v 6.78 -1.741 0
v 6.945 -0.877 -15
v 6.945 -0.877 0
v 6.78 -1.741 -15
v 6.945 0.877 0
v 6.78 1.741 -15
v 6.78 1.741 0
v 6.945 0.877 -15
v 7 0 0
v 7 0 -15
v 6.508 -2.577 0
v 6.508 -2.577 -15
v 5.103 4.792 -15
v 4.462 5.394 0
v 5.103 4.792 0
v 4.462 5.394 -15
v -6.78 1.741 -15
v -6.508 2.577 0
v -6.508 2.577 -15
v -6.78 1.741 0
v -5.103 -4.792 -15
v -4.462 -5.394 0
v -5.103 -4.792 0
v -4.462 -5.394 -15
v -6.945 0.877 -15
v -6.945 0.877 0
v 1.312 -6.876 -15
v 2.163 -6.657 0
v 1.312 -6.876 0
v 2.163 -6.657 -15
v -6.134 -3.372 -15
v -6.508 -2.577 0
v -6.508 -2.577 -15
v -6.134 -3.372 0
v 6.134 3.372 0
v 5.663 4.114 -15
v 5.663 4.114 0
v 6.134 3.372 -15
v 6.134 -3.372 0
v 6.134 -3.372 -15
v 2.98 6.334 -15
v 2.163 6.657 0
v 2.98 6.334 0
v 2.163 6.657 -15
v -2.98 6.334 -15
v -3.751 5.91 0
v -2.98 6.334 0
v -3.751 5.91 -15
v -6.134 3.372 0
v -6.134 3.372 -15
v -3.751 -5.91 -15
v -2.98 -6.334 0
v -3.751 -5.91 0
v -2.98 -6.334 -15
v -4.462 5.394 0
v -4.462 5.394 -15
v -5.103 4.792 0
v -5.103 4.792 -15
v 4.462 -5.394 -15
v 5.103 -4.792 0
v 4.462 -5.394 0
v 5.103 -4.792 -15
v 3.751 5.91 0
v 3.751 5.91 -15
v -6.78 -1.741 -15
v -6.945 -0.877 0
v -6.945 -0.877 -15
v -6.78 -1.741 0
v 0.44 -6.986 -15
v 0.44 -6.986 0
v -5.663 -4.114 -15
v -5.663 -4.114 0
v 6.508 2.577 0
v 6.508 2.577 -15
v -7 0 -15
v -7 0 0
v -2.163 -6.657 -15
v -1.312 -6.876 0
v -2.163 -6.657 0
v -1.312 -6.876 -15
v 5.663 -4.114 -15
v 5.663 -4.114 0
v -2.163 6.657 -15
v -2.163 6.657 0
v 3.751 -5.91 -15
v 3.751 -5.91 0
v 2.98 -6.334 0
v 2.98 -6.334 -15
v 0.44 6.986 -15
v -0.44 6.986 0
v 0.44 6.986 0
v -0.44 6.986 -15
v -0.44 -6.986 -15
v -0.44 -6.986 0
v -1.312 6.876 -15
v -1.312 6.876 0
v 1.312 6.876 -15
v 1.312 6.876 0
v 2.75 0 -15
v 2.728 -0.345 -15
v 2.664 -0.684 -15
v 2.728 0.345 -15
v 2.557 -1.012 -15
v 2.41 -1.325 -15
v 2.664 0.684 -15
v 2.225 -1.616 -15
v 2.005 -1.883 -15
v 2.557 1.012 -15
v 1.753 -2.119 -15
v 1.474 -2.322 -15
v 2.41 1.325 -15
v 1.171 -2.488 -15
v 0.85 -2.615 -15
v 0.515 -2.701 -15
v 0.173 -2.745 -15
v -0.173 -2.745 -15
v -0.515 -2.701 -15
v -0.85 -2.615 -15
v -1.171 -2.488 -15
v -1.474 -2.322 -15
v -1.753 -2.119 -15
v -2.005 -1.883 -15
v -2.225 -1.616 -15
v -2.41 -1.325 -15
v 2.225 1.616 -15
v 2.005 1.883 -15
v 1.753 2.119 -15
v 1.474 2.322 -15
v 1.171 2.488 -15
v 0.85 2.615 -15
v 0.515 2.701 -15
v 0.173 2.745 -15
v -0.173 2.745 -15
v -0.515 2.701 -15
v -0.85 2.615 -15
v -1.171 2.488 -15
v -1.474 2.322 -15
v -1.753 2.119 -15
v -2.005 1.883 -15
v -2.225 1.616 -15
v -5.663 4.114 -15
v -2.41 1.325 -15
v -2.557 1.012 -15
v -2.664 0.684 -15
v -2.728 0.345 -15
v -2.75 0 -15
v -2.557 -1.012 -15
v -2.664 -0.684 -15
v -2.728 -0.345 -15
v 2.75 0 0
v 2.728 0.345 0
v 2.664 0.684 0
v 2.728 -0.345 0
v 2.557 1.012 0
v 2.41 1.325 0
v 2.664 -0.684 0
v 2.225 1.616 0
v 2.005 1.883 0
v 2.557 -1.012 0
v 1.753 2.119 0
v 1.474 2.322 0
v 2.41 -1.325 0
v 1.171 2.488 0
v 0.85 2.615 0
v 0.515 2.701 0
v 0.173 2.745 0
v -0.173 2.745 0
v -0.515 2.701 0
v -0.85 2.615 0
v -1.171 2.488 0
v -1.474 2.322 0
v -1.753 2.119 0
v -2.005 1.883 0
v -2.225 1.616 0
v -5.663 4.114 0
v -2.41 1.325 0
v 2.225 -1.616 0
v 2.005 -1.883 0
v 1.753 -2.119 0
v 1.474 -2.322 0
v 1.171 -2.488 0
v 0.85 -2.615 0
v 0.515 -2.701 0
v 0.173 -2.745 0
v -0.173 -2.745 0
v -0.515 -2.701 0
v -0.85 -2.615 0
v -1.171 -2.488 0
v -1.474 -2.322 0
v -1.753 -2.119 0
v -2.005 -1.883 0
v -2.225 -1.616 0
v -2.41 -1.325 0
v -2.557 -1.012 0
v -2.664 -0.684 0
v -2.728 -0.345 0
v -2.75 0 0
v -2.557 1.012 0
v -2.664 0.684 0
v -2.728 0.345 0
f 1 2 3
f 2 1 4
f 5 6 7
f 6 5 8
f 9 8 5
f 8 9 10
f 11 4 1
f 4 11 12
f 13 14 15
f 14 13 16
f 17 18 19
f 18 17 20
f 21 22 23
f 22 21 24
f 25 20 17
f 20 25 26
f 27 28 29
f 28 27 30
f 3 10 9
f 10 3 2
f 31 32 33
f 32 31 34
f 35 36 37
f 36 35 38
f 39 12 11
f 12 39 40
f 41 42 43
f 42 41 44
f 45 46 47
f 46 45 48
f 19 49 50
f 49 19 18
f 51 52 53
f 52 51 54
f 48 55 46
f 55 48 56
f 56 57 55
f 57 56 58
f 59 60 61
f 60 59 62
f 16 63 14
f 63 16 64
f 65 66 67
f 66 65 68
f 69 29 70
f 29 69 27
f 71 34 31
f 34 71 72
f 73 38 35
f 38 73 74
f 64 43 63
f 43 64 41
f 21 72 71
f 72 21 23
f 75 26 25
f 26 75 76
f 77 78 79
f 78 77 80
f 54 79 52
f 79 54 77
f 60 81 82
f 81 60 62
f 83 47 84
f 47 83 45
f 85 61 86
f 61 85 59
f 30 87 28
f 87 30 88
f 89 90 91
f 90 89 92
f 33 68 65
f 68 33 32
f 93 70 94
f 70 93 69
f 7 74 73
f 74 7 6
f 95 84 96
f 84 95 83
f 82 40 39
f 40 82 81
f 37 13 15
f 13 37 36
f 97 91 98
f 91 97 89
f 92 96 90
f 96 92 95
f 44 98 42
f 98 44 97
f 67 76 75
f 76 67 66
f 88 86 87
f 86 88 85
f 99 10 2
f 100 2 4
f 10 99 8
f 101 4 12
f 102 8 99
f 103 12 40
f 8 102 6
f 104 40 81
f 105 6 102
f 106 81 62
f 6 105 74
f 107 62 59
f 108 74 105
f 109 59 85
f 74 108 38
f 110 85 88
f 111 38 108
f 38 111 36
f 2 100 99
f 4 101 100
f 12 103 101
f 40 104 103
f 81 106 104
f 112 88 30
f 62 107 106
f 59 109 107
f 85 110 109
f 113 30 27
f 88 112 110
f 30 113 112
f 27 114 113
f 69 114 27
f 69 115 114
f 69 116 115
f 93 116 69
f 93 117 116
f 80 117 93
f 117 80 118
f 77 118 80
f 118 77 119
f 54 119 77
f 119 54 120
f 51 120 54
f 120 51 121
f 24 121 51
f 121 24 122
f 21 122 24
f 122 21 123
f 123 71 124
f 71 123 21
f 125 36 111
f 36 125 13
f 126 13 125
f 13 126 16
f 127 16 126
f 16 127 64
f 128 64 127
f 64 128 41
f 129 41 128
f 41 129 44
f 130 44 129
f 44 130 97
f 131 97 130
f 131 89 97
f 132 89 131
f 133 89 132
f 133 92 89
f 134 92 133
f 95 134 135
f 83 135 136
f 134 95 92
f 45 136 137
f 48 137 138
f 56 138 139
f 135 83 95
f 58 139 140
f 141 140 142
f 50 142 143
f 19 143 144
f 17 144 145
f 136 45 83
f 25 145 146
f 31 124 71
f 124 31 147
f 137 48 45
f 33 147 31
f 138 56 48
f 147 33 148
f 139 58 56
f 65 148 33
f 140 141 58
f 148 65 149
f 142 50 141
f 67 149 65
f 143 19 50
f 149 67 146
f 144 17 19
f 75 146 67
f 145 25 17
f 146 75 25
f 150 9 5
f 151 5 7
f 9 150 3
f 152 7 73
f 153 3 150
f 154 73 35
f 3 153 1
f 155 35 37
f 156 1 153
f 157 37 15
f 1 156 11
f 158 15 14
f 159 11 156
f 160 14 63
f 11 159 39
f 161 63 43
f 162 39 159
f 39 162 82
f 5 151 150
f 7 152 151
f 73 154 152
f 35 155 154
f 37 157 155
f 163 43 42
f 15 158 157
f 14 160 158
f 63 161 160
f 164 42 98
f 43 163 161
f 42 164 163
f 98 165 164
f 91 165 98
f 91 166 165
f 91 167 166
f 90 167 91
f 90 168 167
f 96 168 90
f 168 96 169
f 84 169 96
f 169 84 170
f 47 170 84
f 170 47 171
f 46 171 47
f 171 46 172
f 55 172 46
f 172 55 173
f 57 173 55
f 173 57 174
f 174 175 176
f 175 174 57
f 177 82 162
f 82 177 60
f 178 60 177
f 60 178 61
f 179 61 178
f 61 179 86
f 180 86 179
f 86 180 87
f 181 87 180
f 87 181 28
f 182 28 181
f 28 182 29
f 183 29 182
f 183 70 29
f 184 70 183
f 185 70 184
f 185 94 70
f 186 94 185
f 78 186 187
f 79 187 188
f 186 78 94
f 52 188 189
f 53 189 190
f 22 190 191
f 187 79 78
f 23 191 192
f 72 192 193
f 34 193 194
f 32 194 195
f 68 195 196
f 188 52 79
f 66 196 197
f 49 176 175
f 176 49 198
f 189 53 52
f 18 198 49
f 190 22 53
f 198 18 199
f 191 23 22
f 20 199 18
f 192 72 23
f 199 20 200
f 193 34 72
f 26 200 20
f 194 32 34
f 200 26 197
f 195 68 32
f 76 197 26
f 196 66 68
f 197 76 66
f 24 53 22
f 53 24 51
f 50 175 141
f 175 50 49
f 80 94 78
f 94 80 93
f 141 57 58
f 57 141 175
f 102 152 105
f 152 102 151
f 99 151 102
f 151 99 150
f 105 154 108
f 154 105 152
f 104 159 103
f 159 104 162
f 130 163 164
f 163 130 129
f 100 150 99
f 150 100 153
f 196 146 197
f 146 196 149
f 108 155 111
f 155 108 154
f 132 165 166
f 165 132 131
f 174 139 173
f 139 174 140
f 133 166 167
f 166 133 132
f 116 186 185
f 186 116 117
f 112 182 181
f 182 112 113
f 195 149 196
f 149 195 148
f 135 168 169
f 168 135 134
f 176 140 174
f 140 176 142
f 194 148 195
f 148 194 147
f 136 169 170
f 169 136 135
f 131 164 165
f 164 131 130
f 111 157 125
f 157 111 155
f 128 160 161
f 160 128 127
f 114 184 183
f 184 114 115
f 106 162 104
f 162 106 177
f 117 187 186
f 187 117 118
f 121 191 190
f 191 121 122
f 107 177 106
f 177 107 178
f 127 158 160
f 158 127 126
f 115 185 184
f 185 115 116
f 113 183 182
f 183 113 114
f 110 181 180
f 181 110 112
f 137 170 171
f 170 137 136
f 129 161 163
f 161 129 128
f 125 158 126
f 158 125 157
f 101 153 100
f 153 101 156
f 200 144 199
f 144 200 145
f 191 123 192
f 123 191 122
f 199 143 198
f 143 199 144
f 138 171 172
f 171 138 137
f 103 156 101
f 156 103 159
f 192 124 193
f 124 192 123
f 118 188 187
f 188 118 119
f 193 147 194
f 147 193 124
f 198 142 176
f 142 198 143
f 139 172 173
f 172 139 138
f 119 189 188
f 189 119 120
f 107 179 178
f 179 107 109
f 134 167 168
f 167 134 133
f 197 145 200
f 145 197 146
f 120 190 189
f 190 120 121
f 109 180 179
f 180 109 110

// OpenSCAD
$fn = 50;


difference() {
	union() {
		translate(v = [0, 0, -15.0000000000]) {
			cylinder(h = 15, r = 7.0000000000);
		}
		cylinder(h = 0, r = 17.0000000000);
	}
	union() {
		#translate(v = [0, 0, -15]) {
			cylinder(h = 15, r = 2.7500000000);
		}
	}
}
